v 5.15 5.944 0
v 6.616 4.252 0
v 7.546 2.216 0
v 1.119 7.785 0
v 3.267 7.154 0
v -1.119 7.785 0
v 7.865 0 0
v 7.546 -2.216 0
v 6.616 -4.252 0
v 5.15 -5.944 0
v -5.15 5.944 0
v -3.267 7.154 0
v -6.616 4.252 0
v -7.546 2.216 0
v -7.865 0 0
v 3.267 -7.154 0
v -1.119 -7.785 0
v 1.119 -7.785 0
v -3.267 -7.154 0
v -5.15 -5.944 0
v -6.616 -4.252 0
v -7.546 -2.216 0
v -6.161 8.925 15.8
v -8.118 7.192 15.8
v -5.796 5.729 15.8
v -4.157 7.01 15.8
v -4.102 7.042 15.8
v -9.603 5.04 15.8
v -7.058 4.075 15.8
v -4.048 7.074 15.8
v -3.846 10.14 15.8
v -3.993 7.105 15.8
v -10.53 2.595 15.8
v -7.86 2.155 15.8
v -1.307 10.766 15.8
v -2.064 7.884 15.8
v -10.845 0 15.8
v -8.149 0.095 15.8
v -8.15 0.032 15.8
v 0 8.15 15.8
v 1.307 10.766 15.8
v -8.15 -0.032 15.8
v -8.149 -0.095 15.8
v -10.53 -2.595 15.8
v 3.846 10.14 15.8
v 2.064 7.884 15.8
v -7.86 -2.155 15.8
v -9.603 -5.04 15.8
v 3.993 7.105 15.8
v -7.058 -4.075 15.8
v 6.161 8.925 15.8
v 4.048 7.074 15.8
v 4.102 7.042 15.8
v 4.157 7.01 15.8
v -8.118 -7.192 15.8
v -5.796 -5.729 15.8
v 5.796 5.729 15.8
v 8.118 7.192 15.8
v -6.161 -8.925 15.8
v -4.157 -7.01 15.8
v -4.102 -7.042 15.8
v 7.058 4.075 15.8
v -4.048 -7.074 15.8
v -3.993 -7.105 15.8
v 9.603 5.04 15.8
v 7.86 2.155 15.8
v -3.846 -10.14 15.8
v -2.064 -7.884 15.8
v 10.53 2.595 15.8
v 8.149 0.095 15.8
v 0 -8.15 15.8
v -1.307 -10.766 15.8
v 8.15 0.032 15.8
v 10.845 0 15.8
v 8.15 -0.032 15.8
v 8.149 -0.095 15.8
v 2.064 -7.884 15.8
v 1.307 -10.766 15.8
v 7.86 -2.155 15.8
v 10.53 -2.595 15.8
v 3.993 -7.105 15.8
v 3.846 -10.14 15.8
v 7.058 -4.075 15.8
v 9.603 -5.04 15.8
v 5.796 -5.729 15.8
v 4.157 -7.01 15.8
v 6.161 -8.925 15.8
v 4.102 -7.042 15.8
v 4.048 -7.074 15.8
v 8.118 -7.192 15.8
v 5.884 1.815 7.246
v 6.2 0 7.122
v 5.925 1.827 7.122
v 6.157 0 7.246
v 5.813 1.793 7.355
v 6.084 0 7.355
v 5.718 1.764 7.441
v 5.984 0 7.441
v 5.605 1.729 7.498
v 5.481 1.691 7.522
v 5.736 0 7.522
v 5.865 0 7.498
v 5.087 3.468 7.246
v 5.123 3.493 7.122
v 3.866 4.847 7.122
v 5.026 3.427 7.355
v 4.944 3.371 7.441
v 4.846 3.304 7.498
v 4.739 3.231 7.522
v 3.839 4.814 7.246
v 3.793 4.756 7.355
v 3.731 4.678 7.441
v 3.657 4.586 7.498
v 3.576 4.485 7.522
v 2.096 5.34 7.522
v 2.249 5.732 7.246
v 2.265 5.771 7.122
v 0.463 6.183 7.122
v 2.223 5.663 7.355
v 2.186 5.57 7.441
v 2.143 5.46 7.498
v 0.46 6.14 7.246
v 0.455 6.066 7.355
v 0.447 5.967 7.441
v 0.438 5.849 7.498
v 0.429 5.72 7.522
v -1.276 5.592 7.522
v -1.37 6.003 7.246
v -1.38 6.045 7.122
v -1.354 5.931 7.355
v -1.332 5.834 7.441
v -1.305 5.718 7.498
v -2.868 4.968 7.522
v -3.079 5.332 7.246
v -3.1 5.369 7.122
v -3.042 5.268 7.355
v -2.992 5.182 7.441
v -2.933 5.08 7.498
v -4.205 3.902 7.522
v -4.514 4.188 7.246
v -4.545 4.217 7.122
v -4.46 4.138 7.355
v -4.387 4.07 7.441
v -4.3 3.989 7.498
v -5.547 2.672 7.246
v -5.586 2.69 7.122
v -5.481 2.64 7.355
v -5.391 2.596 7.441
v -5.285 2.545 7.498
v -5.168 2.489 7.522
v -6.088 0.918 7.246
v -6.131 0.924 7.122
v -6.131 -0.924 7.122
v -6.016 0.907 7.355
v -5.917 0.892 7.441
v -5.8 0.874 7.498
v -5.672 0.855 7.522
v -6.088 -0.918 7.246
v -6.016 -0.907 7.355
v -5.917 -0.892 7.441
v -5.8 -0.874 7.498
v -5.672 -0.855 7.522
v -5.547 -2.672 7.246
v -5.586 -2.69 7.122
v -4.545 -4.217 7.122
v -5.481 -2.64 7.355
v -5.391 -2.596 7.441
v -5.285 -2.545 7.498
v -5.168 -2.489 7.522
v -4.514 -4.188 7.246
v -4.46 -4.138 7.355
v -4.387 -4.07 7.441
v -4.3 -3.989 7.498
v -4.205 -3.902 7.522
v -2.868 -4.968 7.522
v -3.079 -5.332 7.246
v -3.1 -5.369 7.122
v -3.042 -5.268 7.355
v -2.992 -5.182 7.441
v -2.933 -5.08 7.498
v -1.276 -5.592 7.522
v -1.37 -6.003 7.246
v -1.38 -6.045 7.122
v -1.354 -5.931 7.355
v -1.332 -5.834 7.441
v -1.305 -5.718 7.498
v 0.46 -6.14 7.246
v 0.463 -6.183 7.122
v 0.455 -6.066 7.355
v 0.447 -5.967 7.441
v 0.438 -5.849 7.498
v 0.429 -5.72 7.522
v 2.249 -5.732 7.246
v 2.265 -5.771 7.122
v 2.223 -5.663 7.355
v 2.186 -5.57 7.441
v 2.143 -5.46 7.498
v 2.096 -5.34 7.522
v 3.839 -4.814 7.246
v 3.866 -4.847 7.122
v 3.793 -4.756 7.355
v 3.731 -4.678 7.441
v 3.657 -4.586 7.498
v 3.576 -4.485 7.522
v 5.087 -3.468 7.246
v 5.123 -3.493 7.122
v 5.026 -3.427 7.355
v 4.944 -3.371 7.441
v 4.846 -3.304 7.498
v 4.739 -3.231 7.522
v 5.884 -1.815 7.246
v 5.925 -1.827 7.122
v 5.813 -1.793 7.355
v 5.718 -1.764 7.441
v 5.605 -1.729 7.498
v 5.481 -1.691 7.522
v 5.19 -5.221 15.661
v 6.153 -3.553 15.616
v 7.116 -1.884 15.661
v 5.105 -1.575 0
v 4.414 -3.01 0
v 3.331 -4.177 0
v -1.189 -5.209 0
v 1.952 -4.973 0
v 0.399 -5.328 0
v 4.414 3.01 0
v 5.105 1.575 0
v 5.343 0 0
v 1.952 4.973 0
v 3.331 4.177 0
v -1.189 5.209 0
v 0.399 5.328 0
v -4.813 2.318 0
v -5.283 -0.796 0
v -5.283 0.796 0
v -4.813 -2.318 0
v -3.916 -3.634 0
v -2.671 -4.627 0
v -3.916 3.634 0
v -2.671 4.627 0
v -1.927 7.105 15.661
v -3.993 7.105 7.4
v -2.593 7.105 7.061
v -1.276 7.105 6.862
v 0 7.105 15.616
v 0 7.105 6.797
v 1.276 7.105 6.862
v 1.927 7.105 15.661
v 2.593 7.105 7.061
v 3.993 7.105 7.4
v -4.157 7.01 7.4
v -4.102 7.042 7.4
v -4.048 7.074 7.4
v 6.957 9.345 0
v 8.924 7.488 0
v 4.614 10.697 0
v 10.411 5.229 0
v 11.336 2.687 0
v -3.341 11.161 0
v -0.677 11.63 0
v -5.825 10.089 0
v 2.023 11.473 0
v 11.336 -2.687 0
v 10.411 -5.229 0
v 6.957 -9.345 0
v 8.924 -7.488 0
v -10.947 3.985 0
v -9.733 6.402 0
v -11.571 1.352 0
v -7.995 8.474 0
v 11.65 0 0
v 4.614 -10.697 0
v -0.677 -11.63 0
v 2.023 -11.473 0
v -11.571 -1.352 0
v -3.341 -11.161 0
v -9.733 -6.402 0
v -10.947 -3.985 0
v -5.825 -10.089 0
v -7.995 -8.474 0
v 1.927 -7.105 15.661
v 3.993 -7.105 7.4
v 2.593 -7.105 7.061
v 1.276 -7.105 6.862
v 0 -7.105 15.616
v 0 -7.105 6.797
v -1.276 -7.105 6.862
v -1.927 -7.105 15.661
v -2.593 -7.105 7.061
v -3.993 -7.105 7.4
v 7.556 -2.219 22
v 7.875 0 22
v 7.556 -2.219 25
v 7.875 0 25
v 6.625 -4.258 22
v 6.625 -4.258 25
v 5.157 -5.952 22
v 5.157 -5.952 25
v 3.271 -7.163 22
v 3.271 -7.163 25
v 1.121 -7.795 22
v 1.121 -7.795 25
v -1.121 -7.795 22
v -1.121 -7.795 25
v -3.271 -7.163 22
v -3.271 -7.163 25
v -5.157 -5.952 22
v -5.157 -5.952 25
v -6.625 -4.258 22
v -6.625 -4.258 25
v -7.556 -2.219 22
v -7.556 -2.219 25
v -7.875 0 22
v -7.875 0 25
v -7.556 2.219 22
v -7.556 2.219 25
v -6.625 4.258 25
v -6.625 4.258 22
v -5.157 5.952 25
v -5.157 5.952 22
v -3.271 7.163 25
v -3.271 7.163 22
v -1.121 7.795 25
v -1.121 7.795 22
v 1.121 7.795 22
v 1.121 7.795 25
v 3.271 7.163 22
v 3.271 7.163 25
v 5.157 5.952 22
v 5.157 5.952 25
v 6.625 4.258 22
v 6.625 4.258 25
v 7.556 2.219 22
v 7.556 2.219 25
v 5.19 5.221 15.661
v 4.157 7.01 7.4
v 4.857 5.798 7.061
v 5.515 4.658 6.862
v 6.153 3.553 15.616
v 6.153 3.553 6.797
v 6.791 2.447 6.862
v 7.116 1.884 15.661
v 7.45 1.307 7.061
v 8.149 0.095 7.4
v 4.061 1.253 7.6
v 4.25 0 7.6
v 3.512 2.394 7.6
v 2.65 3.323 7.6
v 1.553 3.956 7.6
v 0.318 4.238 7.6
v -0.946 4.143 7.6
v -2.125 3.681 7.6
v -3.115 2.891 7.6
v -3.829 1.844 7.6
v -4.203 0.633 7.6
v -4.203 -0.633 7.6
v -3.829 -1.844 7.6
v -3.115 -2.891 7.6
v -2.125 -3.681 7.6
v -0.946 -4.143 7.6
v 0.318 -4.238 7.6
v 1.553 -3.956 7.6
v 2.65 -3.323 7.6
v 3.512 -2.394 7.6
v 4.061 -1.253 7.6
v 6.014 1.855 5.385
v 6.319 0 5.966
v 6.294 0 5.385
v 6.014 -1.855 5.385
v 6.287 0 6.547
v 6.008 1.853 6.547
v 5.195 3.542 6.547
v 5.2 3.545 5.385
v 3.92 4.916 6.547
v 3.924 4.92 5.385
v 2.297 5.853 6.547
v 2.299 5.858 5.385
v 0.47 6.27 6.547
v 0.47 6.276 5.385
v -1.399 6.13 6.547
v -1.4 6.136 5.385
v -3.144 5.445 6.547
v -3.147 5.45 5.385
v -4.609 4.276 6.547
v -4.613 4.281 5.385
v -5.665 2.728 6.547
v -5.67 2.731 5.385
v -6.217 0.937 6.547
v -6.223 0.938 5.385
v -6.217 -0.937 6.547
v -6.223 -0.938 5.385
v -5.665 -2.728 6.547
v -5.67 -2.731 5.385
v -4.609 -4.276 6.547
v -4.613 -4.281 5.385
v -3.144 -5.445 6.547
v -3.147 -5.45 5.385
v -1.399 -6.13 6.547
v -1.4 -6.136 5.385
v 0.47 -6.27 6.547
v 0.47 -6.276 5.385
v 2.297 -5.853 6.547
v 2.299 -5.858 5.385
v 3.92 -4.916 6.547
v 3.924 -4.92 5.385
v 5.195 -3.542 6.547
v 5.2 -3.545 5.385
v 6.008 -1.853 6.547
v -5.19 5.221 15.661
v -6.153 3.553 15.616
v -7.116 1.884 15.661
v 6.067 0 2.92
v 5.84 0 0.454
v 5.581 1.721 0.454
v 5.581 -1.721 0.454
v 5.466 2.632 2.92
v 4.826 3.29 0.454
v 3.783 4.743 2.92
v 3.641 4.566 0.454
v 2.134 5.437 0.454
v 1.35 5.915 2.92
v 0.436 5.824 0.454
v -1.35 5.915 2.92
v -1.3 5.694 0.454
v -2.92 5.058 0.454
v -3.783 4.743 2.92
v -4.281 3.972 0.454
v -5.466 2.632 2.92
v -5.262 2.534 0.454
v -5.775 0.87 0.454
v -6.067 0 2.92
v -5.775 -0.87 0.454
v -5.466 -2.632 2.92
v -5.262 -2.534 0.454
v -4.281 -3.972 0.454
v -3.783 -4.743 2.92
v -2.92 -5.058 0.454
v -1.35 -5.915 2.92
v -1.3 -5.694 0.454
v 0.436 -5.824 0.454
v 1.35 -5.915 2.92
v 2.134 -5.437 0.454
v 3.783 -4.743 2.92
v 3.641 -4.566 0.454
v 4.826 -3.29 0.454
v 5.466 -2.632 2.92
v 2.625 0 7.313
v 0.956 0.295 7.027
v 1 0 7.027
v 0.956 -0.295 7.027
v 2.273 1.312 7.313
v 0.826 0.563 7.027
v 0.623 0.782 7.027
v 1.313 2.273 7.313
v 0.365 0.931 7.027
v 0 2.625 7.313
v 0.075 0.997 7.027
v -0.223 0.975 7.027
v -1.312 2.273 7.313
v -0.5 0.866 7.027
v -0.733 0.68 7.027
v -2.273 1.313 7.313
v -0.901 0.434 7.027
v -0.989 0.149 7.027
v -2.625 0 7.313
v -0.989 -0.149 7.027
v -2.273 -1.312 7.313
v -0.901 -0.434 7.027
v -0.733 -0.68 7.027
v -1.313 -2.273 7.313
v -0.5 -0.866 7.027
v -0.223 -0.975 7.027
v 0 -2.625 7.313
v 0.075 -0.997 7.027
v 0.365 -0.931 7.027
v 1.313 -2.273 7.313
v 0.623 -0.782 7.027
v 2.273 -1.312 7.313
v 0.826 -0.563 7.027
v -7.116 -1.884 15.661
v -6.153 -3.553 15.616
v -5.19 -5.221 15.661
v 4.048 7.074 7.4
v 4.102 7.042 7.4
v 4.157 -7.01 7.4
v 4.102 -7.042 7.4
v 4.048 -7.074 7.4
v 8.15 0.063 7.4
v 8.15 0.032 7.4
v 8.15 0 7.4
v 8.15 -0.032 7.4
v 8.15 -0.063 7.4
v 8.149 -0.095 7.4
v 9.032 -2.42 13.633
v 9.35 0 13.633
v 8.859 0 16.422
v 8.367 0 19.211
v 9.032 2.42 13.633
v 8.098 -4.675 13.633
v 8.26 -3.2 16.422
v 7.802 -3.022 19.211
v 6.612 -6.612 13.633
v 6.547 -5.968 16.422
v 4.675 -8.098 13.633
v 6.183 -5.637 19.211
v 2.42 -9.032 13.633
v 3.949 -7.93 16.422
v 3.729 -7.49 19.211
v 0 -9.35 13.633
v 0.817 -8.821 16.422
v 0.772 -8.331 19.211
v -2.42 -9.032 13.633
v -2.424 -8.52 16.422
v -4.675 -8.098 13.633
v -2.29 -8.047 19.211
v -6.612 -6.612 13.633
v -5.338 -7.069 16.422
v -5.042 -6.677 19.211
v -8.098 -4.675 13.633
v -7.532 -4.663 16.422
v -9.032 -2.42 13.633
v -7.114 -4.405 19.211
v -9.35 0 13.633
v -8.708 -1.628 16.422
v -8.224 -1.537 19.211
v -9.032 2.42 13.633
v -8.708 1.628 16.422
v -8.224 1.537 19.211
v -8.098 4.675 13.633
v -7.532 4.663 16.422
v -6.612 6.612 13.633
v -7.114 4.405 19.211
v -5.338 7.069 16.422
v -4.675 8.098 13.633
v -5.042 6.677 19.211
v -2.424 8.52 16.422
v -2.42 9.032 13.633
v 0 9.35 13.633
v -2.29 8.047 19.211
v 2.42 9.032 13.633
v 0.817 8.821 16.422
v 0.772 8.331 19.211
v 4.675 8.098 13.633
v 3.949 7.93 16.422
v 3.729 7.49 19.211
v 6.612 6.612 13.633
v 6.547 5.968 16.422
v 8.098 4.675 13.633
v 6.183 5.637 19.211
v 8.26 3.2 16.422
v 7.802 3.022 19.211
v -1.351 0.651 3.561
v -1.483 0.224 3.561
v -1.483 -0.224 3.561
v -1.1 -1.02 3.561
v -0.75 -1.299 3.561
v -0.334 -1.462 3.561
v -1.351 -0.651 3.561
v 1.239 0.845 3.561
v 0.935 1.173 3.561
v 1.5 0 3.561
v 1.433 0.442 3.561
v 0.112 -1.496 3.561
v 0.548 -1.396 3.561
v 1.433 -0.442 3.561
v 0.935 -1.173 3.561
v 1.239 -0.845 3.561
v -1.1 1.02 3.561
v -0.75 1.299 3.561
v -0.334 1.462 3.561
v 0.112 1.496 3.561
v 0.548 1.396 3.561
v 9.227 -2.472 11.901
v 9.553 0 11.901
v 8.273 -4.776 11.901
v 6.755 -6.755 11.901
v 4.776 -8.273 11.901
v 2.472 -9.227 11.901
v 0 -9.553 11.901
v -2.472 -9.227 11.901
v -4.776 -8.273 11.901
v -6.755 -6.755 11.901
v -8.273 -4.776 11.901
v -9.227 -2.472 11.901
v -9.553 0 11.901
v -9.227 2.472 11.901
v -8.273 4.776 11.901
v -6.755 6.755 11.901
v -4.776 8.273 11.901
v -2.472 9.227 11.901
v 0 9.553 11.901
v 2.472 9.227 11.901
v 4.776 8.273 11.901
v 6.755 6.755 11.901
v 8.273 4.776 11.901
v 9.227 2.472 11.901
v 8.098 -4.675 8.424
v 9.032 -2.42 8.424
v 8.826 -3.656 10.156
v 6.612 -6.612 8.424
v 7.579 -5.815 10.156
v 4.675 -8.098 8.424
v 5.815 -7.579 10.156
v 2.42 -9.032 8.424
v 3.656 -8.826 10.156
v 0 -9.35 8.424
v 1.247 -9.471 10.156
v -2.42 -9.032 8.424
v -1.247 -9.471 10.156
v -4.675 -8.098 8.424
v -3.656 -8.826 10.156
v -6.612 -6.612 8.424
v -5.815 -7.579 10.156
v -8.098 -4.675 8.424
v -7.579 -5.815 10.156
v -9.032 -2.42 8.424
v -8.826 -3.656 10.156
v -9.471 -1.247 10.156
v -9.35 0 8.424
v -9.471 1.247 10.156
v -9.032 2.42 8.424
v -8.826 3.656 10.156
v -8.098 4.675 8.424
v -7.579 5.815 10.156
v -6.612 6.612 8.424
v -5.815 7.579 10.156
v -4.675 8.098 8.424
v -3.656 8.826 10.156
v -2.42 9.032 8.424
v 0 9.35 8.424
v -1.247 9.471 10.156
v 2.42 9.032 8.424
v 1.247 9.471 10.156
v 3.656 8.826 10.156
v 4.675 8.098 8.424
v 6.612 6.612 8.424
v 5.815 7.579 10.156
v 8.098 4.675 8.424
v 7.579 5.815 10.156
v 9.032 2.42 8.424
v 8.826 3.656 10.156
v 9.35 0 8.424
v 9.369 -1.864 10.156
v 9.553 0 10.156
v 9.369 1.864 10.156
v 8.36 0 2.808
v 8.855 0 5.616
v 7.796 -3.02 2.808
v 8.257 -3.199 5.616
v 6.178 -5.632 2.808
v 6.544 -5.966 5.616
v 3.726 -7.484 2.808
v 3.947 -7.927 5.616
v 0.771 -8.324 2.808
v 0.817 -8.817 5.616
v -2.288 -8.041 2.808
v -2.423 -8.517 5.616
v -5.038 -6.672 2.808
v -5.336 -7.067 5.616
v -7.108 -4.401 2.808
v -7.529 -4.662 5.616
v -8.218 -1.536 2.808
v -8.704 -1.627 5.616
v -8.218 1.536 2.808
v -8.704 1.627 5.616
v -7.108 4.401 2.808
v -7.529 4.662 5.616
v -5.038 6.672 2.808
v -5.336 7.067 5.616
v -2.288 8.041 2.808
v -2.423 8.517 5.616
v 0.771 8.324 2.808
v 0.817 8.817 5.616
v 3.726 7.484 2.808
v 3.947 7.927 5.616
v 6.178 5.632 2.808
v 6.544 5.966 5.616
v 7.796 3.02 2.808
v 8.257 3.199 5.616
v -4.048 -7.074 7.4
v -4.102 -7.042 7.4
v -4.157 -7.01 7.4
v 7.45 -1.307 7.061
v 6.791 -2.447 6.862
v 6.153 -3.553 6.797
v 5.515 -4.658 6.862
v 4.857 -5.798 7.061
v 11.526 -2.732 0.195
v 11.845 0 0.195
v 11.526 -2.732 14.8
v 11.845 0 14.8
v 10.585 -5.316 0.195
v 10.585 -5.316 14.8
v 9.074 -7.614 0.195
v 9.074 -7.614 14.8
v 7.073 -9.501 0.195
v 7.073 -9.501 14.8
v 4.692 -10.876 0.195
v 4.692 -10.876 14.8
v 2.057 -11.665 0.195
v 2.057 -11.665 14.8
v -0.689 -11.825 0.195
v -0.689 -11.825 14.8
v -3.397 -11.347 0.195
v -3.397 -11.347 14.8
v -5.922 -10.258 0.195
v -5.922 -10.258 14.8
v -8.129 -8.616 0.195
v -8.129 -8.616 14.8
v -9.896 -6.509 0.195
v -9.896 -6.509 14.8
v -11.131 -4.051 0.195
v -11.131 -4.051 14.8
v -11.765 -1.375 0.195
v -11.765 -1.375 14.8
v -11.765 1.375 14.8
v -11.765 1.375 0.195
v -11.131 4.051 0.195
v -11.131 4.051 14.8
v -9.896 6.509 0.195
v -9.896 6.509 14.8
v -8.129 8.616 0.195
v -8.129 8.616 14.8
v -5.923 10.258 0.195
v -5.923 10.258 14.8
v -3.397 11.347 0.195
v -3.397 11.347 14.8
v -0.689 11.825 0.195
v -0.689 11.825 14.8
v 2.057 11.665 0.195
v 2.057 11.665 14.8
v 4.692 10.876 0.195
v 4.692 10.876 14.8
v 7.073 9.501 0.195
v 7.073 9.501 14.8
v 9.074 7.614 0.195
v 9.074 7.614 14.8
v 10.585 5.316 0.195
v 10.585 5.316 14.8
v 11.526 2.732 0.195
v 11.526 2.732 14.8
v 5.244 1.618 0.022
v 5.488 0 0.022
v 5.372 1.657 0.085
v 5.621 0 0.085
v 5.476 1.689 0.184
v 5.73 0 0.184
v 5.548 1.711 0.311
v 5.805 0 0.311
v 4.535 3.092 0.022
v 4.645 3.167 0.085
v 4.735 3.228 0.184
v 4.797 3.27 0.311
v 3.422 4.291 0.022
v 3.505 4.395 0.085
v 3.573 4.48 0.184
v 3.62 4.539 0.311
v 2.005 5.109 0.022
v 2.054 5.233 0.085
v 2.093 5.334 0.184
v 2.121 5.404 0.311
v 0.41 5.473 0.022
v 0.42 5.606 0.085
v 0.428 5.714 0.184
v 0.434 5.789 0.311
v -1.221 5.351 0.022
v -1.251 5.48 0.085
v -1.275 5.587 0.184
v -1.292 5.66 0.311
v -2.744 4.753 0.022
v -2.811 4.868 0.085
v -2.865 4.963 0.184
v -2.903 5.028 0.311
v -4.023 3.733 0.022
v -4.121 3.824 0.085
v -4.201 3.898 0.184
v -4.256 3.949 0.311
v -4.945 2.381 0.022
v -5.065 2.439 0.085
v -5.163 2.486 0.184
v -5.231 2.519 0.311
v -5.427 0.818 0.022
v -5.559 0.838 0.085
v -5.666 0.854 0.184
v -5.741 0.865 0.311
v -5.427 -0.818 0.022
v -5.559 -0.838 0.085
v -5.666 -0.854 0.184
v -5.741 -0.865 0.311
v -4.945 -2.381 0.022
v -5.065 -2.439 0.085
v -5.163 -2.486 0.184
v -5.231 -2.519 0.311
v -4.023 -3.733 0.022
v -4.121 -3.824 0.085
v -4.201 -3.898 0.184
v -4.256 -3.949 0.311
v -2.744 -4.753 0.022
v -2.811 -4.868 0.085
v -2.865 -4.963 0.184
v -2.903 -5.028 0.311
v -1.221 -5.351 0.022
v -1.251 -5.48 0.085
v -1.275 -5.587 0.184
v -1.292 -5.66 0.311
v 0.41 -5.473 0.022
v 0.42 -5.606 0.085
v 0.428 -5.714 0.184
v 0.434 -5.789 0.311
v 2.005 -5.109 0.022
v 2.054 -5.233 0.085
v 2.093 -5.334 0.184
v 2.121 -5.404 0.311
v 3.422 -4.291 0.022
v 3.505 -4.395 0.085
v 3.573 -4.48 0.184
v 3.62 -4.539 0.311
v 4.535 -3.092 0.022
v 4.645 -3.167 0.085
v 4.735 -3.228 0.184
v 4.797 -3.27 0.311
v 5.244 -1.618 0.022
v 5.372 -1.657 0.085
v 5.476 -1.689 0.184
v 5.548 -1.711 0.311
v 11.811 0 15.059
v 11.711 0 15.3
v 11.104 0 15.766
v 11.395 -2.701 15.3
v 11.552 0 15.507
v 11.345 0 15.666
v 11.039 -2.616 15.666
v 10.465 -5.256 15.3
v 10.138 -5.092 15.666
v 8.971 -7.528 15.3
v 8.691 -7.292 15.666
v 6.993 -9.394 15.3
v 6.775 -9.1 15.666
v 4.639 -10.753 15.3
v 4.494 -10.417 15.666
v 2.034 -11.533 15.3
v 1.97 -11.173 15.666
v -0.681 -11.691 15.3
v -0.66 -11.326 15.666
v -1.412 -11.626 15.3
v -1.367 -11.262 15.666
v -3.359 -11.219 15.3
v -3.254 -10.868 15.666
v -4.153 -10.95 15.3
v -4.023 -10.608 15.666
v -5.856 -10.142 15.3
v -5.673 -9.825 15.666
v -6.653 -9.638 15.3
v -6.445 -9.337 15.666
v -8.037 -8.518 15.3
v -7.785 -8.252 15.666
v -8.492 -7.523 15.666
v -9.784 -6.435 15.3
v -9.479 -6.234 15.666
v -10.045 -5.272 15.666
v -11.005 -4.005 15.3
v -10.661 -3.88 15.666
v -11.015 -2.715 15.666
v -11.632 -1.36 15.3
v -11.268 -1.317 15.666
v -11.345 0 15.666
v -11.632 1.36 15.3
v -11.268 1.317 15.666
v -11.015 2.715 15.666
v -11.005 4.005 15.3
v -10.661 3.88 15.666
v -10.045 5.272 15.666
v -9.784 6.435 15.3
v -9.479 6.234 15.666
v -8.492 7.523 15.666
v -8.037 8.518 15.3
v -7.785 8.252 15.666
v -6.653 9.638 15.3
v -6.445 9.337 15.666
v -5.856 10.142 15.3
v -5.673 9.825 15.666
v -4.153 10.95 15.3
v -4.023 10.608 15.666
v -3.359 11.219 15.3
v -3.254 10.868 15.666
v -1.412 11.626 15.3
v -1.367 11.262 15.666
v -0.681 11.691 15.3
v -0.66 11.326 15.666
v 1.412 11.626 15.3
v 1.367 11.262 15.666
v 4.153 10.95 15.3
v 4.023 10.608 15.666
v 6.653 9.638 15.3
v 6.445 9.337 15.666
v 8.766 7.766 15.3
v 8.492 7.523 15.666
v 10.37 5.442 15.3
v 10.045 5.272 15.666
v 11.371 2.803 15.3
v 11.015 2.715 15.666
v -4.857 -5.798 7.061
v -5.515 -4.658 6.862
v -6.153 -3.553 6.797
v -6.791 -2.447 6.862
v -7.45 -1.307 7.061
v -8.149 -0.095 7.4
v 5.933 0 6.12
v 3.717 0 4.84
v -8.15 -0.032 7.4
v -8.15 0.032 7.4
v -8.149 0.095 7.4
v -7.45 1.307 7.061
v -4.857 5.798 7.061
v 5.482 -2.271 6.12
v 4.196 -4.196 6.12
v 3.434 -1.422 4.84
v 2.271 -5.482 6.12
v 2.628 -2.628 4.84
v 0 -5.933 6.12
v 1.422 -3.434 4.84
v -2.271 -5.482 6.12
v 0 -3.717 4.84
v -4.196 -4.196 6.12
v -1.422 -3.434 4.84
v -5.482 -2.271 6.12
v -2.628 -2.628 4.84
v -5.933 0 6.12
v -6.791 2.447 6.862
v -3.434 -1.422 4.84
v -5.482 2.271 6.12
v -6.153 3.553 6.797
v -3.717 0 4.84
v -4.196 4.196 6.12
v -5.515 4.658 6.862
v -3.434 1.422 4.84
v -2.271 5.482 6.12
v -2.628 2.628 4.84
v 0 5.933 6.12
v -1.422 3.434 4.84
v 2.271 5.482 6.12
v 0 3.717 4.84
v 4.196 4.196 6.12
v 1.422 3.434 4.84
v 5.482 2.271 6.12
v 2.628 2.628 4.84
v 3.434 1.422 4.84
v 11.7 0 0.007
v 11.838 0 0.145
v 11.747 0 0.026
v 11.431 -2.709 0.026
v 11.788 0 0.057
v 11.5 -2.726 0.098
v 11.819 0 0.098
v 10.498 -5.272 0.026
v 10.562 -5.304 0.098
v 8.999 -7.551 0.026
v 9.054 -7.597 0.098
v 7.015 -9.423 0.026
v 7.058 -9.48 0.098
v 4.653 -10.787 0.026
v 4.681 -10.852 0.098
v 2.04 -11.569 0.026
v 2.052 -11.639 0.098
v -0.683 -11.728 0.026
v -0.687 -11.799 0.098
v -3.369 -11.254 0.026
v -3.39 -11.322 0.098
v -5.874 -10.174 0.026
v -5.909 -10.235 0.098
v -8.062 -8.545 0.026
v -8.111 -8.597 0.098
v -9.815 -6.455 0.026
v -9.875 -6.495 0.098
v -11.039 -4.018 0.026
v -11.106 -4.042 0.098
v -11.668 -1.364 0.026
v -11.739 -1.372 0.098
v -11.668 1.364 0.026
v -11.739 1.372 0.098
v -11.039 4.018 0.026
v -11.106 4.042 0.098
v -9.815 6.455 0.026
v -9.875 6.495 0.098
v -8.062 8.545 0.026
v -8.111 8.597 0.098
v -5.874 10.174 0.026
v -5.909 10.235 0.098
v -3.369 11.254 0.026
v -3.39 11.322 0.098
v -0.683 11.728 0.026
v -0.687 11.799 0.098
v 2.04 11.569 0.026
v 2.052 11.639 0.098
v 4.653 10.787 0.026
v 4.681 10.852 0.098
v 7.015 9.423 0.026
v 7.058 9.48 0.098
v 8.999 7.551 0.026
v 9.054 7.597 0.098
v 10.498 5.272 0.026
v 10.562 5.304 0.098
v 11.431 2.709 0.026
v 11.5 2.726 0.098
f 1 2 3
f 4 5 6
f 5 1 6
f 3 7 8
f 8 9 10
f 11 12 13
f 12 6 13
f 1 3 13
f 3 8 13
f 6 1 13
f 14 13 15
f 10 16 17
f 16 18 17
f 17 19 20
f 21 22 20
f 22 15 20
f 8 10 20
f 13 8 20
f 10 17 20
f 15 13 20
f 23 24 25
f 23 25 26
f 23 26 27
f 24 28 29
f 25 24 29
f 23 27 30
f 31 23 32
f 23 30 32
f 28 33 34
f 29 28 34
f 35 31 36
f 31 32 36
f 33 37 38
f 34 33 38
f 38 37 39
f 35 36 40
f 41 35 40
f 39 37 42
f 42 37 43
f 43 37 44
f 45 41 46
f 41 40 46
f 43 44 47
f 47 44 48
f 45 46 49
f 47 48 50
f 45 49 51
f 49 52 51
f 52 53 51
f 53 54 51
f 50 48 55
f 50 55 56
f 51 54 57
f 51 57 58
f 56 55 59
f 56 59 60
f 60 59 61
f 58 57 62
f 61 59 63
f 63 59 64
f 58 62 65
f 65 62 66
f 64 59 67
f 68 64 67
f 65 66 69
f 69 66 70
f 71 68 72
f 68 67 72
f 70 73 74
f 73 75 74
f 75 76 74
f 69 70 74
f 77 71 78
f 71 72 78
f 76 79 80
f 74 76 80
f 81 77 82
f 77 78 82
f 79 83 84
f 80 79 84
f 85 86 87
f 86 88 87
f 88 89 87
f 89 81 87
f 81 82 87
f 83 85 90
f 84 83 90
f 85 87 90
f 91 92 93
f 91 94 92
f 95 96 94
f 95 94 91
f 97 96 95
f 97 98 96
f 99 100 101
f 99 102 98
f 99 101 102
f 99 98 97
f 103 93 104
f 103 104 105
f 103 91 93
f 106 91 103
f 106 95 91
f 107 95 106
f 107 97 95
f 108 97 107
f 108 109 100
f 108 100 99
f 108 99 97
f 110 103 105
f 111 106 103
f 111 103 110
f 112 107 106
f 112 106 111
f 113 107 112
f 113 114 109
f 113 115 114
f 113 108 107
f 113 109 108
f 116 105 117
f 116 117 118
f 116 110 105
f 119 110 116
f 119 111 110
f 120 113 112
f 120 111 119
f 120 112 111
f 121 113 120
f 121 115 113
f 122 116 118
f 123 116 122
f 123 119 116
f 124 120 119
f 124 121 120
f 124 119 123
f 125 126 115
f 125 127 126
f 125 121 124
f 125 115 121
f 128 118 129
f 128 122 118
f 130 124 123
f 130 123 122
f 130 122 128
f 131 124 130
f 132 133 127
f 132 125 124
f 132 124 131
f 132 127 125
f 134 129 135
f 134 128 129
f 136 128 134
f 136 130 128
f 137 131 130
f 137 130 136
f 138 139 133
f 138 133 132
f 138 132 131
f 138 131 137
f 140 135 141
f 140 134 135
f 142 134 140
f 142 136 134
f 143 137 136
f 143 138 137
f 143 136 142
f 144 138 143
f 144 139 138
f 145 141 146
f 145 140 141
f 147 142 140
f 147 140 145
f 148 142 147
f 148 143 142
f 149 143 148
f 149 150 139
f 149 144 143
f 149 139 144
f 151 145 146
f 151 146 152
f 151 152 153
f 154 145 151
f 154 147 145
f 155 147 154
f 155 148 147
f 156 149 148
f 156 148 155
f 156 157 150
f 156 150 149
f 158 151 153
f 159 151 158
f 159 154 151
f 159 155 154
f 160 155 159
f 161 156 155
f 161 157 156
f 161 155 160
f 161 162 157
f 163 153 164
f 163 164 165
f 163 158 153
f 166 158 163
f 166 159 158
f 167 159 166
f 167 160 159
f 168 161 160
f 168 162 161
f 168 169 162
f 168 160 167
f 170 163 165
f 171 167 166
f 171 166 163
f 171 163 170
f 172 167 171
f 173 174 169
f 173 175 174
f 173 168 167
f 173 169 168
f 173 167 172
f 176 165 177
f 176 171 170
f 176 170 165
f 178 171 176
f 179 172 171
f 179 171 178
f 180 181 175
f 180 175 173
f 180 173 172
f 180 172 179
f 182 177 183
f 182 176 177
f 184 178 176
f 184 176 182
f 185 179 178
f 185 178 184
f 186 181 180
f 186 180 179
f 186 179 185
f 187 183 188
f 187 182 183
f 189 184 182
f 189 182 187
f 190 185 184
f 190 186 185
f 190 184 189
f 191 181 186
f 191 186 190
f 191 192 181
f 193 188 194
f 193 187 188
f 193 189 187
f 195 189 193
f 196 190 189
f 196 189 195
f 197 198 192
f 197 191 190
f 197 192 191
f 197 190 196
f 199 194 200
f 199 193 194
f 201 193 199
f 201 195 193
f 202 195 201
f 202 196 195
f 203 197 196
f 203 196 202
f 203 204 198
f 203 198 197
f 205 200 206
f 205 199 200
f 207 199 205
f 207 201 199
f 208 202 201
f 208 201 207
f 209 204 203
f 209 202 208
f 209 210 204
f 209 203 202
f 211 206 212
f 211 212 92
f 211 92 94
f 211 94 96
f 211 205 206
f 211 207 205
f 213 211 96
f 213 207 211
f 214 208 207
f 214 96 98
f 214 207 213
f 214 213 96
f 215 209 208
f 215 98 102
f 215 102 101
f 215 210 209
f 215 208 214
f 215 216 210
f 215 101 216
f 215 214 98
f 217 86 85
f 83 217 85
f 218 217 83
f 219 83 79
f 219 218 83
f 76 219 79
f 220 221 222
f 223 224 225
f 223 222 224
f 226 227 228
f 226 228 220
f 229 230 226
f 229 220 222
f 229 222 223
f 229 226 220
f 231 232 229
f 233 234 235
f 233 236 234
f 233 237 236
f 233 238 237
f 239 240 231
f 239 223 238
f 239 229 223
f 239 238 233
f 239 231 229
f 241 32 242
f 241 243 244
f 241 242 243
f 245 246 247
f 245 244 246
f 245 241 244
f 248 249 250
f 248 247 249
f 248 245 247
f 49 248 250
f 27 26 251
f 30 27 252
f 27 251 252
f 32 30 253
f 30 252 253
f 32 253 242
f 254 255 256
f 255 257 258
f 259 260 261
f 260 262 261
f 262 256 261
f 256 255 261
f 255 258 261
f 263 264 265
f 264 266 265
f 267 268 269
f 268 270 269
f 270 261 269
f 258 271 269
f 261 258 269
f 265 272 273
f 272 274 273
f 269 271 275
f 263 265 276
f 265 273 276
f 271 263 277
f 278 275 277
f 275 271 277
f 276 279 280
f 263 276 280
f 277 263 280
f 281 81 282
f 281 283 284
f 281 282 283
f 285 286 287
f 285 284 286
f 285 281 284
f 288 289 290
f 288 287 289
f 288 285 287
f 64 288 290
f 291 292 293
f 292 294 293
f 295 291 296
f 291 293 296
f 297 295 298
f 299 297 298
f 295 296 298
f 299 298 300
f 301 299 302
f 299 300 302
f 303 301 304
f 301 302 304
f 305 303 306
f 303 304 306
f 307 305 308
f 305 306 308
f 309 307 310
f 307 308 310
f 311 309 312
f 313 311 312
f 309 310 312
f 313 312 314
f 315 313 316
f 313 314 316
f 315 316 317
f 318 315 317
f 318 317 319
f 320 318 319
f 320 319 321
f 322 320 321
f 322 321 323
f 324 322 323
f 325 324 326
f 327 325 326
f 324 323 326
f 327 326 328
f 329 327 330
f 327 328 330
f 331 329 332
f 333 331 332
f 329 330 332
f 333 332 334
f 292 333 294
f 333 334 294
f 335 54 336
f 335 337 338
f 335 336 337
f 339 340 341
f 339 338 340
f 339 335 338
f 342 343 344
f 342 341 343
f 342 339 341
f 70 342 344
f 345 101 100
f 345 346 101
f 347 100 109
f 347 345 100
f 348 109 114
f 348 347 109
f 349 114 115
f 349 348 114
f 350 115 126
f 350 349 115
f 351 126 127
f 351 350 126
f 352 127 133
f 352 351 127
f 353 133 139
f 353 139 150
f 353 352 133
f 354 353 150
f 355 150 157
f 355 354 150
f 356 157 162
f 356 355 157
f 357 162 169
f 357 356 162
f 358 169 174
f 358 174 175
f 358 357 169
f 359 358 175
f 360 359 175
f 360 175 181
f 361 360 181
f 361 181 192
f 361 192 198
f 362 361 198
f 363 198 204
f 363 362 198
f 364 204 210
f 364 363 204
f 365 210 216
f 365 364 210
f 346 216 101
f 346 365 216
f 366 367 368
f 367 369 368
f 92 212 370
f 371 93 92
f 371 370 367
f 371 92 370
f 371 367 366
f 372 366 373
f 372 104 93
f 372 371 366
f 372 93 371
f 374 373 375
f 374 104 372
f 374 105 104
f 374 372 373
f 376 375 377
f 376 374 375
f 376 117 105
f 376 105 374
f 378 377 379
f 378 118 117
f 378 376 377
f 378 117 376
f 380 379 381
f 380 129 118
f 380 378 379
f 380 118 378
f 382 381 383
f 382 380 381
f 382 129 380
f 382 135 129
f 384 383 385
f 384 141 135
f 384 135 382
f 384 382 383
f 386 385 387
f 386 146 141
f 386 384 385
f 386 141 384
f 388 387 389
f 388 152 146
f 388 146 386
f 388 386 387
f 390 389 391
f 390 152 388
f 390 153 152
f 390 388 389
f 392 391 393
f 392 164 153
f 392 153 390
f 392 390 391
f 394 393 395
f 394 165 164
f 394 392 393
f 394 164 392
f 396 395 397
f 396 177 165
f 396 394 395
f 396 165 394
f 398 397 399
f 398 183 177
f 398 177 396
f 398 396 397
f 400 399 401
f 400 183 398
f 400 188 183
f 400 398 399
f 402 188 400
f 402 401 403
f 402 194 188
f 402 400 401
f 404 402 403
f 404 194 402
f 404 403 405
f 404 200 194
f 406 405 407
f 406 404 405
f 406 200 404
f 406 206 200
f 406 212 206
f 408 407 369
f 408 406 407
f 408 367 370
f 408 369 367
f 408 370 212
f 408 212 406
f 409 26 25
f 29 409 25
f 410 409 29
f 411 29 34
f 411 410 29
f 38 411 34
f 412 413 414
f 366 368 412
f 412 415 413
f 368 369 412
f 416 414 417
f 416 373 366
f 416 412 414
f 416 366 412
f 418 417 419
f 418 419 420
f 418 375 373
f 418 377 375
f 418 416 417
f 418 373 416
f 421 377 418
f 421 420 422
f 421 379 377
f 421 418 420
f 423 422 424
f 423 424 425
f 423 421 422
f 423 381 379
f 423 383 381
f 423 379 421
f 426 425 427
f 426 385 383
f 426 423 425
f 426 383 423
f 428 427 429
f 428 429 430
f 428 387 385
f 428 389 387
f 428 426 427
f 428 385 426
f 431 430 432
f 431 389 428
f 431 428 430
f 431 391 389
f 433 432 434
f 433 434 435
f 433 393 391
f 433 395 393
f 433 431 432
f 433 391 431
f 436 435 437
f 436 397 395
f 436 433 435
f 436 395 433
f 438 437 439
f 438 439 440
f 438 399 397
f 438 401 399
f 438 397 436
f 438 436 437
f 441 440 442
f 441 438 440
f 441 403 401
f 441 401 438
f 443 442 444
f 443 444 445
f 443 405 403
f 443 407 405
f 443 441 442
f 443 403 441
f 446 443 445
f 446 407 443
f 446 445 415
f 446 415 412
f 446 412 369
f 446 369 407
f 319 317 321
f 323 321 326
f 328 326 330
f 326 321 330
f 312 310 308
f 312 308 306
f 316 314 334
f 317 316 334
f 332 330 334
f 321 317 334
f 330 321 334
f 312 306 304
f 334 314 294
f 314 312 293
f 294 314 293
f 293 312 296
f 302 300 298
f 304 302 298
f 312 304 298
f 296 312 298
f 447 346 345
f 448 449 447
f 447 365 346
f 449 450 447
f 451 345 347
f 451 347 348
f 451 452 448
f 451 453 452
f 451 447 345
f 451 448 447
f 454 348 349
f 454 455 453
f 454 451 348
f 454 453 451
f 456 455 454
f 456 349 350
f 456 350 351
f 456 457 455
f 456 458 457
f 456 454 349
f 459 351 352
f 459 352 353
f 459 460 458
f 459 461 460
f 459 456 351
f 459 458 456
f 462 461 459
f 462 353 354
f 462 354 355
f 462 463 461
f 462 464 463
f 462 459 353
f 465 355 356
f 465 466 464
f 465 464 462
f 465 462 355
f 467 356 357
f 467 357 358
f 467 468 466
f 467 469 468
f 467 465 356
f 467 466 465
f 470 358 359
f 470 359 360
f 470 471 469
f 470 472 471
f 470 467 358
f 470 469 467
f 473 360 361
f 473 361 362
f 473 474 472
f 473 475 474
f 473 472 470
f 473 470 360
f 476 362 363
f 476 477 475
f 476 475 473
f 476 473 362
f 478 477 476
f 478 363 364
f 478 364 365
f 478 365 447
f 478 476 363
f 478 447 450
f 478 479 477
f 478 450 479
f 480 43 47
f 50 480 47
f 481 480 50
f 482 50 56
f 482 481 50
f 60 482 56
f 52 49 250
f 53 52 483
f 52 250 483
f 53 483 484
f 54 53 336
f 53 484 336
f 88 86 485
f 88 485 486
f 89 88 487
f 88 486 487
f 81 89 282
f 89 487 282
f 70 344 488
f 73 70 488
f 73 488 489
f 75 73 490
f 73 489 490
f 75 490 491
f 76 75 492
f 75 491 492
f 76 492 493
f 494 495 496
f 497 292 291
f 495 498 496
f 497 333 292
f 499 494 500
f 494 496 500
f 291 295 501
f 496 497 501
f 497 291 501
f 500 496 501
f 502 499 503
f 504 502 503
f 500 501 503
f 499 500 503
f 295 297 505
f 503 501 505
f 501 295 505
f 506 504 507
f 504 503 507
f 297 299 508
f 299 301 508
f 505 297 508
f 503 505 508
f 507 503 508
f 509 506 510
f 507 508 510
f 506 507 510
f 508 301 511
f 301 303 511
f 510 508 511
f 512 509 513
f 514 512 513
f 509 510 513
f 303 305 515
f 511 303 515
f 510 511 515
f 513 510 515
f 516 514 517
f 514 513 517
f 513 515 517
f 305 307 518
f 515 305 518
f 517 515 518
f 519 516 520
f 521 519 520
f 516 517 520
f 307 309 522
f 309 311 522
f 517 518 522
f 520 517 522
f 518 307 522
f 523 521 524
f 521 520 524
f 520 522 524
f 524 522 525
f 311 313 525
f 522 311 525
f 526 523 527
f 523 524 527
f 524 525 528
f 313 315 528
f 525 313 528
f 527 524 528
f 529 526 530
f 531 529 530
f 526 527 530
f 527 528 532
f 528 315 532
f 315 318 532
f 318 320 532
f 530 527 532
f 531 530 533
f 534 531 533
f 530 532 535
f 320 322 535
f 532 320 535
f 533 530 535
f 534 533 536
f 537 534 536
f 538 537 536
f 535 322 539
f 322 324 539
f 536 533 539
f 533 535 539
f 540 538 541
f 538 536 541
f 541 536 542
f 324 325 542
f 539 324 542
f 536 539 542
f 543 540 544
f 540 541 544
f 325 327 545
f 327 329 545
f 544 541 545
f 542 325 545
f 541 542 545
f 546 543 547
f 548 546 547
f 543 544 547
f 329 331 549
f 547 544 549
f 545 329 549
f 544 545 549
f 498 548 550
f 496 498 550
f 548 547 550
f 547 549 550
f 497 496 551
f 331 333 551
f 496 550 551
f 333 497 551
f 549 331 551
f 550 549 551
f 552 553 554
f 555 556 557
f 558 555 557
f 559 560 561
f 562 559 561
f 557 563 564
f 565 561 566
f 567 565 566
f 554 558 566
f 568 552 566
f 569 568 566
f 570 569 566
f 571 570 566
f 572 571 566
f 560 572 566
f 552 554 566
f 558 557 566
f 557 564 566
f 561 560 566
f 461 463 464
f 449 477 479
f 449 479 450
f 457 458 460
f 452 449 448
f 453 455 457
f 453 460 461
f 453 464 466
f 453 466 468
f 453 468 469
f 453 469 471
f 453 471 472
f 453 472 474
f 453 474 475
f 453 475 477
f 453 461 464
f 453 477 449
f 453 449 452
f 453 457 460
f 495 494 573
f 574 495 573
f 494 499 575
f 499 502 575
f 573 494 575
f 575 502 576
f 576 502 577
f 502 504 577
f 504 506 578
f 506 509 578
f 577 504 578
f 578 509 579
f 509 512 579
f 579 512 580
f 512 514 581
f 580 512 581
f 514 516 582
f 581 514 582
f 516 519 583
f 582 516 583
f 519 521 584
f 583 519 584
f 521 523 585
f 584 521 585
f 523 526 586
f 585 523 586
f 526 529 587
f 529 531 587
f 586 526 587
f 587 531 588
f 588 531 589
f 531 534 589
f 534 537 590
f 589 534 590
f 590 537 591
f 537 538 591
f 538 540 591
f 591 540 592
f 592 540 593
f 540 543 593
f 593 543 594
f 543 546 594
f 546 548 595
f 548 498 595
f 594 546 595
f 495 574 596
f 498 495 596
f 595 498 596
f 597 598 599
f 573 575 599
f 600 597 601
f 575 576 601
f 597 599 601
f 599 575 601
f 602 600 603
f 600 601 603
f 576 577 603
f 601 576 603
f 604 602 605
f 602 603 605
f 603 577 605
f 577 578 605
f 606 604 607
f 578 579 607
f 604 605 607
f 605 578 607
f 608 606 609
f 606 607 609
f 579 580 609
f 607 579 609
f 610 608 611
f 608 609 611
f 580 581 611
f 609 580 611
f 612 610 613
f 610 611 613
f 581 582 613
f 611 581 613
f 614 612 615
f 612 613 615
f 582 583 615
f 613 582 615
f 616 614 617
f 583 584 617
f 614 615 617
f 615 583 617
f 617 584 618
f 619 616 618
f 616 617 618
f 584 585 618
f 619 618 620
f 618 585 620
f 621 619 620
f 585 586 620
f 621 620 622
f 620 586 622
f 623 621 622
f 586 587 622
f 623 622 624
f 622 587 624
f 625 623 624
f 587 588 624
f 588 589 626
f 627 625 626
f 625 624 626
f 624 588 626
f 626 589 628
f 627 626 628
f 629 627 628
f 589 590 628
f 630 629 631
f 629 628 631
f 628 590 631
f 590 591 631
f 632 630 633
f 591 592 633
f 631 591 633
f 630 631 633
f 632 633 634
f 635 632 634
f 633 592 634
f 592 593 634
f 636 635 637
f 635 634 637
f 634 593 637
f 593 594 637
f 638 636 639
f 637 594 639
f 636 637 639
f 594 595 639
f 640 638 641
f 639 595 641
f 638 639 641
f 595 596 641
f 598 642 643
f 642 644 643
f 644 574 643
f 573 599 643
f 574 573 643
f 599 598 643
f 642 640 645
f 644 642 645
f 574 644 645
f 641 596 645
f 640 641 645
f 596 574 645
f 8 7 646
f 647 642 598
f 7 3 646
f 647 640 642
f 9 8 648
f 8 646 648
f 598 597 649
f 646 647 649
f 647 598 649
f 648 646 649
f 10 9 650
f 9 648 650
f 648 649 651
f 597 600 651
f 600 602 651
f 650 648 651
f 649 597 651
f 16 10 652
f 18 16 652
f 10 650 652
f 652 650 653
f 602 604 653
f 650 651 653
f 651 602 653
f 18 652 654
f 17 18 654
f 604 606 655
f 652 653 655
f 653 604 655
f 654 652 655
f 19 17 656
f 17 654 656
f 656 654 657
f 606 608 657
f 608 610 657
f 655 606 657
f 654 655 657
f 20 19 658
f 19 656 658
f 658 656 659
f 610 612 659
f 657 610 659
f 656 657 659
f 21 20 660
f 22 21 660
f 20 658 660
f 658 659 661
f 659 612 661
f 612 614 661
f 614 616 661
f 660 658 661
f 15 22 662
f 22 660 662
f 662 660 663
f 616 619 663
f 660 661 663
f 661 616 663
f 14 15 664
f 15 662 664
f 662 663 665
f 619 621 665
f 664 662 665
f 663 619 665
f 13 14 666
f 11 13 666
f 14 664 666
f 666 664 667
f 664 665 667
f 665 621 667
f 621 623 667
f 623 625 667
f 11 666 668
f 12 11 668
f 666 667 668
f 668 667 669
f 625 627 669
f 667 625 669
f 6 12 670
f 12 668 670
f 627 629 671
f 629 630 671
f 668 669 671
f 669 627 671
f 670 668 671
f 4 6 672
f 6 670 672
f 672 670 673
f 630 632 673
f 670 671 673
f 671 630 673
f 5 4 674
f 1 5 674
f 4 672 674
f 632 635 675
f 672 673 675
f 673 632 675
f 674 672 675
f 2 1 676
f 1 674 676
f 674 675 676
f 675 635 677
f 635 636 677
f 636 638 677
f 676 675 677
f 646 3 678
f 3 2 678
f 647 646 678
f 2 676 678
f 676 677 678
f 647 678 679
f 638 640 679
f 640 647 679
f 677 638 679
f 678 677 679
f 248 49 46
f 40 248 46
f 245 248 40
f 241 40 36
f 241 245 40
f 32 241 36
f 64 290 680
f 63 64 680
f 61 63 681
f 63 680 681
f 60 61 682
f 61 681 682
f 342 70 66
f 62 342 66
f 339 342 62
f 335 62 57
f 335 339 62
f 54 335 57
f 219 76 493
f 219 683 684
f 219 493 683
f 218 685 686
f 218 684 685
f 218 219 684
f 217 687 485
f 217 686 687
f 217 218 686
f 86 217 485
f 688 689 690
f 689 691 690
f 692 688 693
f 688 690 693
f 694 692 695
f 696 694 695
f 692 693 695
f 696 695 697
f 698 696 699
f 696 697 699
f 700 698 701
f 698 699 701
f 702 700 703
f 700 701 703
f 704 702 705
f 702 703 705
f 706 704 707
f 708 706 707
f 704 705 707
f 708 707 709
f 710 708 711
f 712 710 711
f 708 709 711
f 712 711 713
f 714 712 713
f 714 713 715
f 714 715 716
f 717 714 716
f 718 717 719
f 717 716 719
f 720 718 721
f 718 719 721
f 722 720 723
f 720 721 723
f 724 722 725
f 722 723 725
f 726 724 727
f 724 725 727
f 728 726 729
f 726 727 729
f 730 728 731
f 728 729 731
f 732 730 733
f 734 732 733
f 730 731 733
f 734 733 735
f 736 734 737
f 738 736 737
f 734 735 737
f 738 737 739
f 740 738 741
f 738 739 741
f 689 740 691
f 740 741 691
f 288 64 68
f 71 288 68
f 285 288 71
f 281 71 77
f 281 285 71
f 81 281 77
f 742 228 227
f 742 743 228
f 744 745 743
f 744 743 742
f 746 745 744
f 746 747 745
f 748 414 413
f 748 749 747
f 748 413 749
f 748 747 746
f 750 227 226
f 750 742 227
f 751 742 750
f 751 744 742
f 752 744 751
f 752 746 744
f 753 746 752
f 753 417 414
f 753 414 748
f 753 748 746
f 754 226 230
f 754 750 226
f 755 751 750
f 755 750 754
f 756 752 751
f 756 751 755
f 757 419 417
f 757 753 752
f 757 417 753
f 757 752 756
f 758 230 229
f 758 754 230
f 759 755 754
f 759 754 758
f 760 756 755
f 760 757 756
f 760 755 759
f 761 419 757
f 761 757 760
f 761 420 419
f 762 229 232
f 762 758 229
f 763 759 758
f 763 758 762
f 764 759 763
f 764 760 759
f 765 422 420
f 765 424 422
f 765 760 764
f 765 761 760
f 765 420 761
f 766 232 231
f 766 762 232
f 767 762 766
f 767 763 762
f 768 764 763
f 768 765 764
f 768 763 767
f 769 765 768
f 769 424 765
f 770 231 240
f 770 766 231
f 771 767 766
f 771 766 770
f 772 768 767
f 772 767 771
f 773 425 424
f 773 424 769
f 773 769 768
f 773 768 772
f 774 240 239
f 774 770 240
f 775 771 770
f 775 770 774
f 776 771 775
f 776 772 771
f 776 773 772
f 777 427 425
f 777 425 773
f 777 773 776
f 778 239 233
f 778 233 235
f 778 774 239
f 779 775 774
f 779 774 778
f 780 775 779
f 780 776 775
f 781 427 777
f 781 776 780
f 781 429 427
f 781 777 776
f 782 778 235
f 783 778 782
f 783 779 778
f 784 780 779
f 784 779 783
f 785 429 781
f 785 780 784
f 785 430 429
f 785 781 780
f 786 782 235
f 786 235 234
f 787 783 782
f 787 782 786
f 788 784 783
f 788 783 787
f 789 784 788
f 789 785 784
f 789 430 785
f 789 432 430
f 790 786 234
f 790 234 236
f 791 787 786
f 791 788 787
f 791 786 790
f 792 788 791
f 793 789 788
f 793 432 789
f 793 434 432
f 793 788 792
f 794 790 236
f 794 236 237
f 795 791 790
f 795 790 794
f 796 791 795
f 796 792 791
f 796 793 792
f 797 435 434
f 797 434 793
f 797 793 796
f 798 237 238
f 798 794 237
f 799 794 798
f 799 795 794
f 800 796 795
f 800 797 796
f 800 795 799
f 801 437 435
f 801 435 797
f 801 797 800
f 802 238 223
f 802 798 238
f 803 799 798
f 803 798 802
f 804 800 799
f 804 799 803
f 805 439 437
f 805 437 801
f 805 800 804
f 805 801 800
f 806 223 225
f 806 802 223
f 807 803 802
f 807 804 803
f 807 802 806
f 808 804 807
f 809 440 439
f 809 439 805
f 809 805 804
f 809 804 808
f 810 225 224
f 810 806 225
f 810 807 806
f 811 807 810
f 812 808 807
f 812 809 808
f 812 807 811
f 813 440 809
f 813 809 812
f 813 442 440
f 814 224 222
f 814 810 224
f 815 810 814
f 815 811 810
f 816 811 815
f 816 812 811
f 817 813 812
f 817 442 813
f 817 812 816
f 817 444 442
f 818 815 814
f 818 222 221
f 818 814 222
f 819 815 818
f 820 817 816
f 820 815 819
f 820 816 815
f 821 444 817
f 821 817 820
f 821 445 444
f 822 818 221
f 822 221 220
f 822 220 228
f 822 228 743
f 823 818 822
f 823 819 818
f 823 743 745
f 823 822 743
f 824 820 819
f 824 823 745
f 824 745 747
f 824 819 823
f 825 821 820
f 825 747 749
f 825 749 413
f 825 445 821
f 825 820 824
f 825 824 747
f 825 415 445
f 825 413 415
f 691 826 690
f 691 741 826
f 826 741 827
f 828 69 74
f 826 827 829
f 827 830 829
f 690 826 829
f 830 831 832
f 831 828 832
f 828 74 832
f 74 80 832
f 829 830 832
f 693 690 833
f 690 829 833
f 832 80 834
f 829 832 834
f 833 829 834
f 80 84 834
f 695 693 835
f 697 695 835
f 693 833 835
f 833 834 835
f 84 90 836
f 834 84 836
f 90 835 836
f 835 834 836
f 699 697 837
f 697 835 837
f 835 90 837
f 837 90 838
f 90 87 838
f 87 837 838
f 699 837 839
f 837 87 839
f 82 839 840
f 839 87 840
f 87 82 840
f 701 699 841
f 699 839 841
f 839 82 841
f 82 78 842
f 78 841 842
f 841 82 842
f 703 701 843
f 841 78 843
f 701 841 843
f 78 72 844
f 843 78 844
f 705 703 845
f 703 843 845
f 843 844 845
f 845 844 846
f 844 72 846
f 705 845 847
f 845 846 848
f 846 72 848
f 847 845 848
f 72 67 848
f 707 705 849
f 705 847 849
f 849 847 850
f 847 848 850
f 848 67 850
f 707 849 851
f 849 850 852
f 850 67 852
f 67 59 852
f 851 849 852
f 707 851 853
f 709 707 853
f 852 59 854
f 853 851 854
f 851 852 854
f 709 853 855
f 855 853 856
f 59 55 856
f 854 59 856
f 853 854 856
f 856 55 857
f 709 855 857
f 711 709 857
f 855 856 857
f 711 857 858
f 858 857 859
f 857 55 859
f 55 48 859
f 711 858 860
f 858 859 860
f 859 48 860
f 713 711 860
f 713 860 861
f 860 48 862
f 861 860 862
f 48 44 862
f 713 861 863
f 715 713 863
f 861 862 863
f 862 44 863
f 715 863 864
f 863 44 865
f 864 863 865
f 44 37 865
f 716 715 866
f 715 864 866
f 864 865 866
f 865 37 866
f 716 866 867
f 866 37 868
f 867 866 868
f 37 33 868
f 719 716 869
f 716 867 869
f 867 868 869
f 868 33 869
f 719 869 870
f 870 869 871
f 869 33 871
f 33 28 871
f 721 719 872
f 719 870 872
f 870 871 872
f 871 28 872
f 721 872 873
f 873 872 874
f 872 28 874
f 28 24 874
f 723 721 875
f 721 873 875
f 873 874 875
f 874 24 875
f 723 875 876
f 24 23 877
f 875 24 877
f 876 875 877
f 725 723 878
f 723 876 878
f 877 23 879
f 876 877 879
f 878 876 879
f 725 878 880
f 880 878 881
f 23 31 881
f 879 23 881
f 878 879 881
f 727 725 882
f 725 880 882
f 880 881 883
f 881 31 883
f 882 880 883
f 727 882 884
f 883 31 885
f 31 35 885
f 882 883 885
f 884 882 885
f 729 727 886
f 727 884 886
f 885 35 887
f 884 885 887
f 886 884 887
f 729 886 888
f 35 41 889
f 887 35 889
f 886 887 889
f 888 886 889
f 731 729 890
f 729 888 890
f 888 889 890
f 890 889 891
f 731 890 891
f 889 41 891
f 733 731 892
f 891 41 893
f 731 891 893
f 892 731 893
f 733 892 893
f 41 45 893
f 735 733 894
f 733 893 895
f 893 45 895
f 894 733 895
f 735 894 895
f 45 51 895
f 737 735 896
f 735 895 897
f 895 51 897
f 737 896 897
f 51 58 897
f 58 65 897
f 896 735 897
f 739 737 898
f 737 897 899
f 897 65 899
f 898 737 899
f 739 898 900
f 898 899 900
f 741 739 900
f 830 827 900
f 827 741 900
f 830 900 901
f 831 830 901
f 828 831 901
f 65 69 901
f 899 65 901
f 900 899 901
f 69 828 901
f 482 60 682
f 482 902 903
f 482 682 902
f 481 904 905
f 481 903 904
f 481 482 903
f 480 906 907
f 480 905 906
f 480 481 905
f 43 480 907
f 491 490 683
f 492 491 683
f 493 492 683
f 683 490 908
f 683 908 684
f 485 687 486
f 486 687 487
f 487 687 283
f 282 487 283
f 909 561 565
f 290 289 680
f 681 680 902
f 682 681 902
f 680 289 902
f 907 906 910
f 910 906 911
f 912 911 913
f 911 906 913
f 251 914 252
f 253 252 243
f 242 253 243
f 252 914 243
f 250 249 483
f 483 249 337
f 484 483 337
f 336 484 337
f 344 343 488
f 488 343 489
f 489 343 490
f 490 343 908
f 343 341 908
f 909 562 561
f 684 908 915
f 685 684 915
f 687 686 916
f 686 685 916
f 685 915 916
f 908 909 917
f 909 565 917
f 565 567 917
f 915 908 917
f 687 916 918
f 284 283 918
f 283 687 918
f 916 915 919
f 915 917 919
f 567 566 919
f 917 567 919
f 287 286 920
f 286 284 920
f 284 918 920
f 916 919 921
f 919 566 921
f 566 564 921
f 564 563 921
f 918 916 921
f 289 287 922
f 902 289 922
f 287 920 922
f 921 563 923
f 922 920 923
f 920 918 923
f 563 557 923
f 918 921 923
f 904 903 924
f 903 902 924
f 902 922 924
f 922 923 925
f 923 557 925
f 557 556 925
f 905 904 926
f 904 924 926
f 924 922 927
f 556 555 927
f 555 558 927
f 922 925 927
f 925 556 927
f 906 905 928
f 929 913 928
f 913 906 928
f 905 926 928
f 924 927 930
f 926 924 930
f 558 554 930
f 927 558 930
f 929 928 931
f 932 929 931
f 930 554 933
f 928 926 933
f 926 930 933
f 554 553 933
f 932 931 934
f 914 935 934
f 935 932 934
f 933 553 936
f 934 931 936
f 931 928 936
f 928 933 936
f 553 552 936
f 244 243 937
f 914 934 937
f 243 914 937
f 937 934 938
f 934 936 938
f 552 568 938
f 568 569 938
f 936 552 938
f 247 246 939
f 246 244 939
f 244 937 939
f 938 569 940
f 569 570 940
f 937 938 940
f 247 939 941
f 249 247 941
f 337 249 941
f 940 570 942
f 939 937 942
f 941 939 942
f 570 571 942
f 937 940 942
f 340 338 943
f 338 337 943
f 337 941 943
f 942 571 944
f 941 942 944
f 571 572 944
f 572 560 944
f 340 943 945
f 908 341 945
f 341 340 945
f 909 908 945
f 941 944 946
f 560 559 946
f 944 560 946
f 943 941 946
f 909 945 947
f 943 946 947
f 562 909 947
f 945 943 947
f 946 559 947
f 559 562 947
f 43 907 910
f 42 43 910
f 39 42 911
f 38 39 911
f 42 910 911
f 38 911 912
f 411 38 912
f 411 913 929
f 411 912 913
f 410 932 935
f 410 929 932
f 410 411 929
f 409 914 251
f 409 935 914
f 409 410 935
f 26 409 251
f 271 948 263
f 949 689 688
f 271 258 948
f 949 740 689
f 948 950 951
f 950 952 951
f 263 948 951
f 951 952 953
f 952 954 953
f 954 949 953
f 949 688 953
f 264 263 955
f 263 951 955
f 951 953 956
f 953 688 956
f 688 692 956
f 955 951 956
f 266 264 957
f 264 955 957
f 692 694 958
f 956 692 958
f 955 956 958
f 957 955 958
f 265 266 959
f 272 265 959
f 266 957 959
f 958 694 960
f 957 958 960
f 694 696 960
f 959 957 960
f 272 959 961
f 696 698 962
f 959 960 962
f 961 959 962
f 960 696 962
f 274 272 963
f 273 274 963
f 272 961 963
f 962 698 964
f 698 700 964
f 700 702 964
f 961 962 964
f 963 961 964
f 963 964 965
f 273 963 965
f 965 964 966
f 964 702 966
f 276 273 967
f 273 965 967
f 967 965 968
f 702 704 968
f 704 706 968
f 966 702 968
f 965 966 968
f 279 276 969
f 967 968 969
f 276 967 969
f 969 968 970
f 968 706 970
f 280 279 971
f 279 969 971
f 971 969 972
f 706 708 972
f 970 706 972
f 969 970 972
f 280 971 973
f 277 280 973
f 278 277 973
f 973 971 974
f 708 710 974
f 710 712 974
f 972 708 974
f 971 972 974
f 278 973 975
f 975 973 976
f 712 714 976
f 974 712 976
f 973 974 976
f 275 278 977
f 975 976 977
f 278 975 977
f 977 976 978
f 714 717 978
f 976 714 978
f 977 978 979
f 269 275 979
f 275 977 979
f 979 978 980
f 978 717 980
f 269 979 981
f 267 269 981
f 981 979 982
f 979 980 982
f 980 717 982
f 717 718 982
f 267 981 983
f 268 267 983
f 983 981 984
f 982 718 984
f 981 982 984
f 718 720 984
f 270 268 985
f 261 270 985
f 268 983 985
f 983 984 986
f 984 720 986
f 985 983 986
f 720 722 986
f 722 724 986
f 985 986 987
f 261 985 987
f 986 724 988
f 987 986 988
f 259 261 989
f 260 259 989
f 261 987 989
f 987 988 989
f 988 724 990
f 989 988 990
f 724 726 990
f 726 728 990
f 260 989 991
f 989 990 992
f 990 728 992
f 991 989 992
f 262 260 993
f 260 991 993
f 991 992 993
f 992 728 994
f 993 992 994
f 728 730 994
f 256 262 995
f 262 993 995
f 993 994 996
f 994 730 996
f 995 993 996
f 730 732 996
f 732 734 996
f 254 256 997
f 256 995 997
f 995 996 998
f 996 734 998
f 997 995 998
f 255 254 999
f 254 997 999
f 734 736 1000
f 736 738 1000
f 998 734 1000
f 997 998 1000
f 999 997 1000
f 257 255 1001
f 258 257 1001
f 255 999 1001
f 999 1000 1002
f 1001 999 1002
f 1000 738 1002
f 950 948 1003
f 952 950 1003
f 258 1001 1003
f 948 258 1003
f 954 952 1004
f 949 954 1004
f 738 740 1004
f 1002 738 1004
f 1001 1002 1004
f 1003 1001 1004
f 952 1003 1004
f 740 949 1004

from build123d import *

# Parameters (mm, degrees)
F2_R     = 10.845
F3_DEPTH = 15.8
F4_R     = 8.15
F5_DEPTH = 1
F5_TAPER = 80


# Not quite as in the source:
# - an extrude ends at something that could not be found from the text; its depth is read off the source's solid


with BuildPart() as f1:
    # F0 (on Front) → F1 (revolve)
    with BuildSketch(Plane.XZ):
        with BuildLine():
            Line((10.845, 15.8), (8.15, 15.8))
            Line((8.15, 15.8), (8.15, 7.4))
            Line((8.15, 7.4), (1.5, 3.5606207099))
            Line((1.5, 3.5606207099), (0, 3.5606207099))
            Line((0, 3.5606207099), (0, 0))
            Line((0, 0), (11.65, 0))
            ThreePointArc((11.65, 0), (11.7878858223, 0.0571141777), (11.845, 0.195))
            Line((11.845, 0.195), (11.845, 14.8))
            ThreePointArc((11.845, 14.8), (11.5521067812, 15.5071067812), (10.845, 15.8))
        make_face()
    revolve(axis=Axis((0, 0, 1.7803103549), (0, 0, -1)))

    # F2 (on face) → F3 (join, through all)
    with BuildSketch(Plane.XY.offset(15.8)):
        Circle(F2_R)
        Polygon((-8.2041473252, 0), (-4.1020736626, 7.105), (4.1020736626, 7.105), (8.2041473252, 0), (4.1020736626, -7.105), (-4.1020736626, -7.105), align=None, mode=Mode.SUBTRACT)
    extrude(amount=-F3_DEPTH)

    # F4 (on face) → F5 (cut)
    with BuildSketch(Plane.XY.offset(15.8)):
        Circle(F4_R)
    extrude(amount=-F5_DEPTH, taper=F5_TAPER, mode=Mode.SUBTRACT)


with BuildPart() as f7:
    # F6 (on Front) → F7 (revolve)
    with BuildSketch(Plane.XZ):
        with BuildLine():
            Line((7.875, 25), (0, 25))
            Line((0, 25), (0, 0))
            Line((0, 0), (7.865, 0))
            Line((7.865, 0), (9.3503139047, 8.4236337441))
            ThreePointArc((9.3503139047, 8.4236337441), (9.5781976095, 11.0283564091), (9.3503139047, 13.6330790741))
            Line((9.3503139047, 13.6330790741), (7.875, 22))
            Line((7.875, 22), (7.875, 25))
        make_face()
    revolve(axis=Axis((0, 0, 12.5), (0, 0, -1)))


with BuildPart() as f9:
    # F8 (on Front) → F9 (revolve)
    with BuildSketch(Plane.XZ):
        with BuildLine():
            Line((0, 7.0269373127), (0, 0))
            Line((0, 0), (5.3425146232, 0))
            ThreePointArc((5.3425146232, 0), (5.679504679, 0.1306252549), (5.840417087, 0.4542491907))
            Line((5.840417087, 0.4542491907), (6.2935137888, 5.3852650008))
            ThreePointArc((6.2935137888, 5.3852650008), (6.3100029903, 6.2569191501), (6.2, 7.1217614432))
            ThreePointArc((6.2, 7.1217614432), (6.0365510119, 7.4013445877), (5.7360583301, 7.522118983))
            Line((5.7360583301, 7.522118983), (4.25, 7.6))
            Line((4.25, 7.6), (1, 7.0269373127))
            Line((1, 7.0269373127), (0, 7.0269373127))
        make_face()
    revolve(axis=Axis((0, 0, 3.5134686563), (0, 0, 1)))


solid = Compound([f1.part, f7.part, f9.part])
